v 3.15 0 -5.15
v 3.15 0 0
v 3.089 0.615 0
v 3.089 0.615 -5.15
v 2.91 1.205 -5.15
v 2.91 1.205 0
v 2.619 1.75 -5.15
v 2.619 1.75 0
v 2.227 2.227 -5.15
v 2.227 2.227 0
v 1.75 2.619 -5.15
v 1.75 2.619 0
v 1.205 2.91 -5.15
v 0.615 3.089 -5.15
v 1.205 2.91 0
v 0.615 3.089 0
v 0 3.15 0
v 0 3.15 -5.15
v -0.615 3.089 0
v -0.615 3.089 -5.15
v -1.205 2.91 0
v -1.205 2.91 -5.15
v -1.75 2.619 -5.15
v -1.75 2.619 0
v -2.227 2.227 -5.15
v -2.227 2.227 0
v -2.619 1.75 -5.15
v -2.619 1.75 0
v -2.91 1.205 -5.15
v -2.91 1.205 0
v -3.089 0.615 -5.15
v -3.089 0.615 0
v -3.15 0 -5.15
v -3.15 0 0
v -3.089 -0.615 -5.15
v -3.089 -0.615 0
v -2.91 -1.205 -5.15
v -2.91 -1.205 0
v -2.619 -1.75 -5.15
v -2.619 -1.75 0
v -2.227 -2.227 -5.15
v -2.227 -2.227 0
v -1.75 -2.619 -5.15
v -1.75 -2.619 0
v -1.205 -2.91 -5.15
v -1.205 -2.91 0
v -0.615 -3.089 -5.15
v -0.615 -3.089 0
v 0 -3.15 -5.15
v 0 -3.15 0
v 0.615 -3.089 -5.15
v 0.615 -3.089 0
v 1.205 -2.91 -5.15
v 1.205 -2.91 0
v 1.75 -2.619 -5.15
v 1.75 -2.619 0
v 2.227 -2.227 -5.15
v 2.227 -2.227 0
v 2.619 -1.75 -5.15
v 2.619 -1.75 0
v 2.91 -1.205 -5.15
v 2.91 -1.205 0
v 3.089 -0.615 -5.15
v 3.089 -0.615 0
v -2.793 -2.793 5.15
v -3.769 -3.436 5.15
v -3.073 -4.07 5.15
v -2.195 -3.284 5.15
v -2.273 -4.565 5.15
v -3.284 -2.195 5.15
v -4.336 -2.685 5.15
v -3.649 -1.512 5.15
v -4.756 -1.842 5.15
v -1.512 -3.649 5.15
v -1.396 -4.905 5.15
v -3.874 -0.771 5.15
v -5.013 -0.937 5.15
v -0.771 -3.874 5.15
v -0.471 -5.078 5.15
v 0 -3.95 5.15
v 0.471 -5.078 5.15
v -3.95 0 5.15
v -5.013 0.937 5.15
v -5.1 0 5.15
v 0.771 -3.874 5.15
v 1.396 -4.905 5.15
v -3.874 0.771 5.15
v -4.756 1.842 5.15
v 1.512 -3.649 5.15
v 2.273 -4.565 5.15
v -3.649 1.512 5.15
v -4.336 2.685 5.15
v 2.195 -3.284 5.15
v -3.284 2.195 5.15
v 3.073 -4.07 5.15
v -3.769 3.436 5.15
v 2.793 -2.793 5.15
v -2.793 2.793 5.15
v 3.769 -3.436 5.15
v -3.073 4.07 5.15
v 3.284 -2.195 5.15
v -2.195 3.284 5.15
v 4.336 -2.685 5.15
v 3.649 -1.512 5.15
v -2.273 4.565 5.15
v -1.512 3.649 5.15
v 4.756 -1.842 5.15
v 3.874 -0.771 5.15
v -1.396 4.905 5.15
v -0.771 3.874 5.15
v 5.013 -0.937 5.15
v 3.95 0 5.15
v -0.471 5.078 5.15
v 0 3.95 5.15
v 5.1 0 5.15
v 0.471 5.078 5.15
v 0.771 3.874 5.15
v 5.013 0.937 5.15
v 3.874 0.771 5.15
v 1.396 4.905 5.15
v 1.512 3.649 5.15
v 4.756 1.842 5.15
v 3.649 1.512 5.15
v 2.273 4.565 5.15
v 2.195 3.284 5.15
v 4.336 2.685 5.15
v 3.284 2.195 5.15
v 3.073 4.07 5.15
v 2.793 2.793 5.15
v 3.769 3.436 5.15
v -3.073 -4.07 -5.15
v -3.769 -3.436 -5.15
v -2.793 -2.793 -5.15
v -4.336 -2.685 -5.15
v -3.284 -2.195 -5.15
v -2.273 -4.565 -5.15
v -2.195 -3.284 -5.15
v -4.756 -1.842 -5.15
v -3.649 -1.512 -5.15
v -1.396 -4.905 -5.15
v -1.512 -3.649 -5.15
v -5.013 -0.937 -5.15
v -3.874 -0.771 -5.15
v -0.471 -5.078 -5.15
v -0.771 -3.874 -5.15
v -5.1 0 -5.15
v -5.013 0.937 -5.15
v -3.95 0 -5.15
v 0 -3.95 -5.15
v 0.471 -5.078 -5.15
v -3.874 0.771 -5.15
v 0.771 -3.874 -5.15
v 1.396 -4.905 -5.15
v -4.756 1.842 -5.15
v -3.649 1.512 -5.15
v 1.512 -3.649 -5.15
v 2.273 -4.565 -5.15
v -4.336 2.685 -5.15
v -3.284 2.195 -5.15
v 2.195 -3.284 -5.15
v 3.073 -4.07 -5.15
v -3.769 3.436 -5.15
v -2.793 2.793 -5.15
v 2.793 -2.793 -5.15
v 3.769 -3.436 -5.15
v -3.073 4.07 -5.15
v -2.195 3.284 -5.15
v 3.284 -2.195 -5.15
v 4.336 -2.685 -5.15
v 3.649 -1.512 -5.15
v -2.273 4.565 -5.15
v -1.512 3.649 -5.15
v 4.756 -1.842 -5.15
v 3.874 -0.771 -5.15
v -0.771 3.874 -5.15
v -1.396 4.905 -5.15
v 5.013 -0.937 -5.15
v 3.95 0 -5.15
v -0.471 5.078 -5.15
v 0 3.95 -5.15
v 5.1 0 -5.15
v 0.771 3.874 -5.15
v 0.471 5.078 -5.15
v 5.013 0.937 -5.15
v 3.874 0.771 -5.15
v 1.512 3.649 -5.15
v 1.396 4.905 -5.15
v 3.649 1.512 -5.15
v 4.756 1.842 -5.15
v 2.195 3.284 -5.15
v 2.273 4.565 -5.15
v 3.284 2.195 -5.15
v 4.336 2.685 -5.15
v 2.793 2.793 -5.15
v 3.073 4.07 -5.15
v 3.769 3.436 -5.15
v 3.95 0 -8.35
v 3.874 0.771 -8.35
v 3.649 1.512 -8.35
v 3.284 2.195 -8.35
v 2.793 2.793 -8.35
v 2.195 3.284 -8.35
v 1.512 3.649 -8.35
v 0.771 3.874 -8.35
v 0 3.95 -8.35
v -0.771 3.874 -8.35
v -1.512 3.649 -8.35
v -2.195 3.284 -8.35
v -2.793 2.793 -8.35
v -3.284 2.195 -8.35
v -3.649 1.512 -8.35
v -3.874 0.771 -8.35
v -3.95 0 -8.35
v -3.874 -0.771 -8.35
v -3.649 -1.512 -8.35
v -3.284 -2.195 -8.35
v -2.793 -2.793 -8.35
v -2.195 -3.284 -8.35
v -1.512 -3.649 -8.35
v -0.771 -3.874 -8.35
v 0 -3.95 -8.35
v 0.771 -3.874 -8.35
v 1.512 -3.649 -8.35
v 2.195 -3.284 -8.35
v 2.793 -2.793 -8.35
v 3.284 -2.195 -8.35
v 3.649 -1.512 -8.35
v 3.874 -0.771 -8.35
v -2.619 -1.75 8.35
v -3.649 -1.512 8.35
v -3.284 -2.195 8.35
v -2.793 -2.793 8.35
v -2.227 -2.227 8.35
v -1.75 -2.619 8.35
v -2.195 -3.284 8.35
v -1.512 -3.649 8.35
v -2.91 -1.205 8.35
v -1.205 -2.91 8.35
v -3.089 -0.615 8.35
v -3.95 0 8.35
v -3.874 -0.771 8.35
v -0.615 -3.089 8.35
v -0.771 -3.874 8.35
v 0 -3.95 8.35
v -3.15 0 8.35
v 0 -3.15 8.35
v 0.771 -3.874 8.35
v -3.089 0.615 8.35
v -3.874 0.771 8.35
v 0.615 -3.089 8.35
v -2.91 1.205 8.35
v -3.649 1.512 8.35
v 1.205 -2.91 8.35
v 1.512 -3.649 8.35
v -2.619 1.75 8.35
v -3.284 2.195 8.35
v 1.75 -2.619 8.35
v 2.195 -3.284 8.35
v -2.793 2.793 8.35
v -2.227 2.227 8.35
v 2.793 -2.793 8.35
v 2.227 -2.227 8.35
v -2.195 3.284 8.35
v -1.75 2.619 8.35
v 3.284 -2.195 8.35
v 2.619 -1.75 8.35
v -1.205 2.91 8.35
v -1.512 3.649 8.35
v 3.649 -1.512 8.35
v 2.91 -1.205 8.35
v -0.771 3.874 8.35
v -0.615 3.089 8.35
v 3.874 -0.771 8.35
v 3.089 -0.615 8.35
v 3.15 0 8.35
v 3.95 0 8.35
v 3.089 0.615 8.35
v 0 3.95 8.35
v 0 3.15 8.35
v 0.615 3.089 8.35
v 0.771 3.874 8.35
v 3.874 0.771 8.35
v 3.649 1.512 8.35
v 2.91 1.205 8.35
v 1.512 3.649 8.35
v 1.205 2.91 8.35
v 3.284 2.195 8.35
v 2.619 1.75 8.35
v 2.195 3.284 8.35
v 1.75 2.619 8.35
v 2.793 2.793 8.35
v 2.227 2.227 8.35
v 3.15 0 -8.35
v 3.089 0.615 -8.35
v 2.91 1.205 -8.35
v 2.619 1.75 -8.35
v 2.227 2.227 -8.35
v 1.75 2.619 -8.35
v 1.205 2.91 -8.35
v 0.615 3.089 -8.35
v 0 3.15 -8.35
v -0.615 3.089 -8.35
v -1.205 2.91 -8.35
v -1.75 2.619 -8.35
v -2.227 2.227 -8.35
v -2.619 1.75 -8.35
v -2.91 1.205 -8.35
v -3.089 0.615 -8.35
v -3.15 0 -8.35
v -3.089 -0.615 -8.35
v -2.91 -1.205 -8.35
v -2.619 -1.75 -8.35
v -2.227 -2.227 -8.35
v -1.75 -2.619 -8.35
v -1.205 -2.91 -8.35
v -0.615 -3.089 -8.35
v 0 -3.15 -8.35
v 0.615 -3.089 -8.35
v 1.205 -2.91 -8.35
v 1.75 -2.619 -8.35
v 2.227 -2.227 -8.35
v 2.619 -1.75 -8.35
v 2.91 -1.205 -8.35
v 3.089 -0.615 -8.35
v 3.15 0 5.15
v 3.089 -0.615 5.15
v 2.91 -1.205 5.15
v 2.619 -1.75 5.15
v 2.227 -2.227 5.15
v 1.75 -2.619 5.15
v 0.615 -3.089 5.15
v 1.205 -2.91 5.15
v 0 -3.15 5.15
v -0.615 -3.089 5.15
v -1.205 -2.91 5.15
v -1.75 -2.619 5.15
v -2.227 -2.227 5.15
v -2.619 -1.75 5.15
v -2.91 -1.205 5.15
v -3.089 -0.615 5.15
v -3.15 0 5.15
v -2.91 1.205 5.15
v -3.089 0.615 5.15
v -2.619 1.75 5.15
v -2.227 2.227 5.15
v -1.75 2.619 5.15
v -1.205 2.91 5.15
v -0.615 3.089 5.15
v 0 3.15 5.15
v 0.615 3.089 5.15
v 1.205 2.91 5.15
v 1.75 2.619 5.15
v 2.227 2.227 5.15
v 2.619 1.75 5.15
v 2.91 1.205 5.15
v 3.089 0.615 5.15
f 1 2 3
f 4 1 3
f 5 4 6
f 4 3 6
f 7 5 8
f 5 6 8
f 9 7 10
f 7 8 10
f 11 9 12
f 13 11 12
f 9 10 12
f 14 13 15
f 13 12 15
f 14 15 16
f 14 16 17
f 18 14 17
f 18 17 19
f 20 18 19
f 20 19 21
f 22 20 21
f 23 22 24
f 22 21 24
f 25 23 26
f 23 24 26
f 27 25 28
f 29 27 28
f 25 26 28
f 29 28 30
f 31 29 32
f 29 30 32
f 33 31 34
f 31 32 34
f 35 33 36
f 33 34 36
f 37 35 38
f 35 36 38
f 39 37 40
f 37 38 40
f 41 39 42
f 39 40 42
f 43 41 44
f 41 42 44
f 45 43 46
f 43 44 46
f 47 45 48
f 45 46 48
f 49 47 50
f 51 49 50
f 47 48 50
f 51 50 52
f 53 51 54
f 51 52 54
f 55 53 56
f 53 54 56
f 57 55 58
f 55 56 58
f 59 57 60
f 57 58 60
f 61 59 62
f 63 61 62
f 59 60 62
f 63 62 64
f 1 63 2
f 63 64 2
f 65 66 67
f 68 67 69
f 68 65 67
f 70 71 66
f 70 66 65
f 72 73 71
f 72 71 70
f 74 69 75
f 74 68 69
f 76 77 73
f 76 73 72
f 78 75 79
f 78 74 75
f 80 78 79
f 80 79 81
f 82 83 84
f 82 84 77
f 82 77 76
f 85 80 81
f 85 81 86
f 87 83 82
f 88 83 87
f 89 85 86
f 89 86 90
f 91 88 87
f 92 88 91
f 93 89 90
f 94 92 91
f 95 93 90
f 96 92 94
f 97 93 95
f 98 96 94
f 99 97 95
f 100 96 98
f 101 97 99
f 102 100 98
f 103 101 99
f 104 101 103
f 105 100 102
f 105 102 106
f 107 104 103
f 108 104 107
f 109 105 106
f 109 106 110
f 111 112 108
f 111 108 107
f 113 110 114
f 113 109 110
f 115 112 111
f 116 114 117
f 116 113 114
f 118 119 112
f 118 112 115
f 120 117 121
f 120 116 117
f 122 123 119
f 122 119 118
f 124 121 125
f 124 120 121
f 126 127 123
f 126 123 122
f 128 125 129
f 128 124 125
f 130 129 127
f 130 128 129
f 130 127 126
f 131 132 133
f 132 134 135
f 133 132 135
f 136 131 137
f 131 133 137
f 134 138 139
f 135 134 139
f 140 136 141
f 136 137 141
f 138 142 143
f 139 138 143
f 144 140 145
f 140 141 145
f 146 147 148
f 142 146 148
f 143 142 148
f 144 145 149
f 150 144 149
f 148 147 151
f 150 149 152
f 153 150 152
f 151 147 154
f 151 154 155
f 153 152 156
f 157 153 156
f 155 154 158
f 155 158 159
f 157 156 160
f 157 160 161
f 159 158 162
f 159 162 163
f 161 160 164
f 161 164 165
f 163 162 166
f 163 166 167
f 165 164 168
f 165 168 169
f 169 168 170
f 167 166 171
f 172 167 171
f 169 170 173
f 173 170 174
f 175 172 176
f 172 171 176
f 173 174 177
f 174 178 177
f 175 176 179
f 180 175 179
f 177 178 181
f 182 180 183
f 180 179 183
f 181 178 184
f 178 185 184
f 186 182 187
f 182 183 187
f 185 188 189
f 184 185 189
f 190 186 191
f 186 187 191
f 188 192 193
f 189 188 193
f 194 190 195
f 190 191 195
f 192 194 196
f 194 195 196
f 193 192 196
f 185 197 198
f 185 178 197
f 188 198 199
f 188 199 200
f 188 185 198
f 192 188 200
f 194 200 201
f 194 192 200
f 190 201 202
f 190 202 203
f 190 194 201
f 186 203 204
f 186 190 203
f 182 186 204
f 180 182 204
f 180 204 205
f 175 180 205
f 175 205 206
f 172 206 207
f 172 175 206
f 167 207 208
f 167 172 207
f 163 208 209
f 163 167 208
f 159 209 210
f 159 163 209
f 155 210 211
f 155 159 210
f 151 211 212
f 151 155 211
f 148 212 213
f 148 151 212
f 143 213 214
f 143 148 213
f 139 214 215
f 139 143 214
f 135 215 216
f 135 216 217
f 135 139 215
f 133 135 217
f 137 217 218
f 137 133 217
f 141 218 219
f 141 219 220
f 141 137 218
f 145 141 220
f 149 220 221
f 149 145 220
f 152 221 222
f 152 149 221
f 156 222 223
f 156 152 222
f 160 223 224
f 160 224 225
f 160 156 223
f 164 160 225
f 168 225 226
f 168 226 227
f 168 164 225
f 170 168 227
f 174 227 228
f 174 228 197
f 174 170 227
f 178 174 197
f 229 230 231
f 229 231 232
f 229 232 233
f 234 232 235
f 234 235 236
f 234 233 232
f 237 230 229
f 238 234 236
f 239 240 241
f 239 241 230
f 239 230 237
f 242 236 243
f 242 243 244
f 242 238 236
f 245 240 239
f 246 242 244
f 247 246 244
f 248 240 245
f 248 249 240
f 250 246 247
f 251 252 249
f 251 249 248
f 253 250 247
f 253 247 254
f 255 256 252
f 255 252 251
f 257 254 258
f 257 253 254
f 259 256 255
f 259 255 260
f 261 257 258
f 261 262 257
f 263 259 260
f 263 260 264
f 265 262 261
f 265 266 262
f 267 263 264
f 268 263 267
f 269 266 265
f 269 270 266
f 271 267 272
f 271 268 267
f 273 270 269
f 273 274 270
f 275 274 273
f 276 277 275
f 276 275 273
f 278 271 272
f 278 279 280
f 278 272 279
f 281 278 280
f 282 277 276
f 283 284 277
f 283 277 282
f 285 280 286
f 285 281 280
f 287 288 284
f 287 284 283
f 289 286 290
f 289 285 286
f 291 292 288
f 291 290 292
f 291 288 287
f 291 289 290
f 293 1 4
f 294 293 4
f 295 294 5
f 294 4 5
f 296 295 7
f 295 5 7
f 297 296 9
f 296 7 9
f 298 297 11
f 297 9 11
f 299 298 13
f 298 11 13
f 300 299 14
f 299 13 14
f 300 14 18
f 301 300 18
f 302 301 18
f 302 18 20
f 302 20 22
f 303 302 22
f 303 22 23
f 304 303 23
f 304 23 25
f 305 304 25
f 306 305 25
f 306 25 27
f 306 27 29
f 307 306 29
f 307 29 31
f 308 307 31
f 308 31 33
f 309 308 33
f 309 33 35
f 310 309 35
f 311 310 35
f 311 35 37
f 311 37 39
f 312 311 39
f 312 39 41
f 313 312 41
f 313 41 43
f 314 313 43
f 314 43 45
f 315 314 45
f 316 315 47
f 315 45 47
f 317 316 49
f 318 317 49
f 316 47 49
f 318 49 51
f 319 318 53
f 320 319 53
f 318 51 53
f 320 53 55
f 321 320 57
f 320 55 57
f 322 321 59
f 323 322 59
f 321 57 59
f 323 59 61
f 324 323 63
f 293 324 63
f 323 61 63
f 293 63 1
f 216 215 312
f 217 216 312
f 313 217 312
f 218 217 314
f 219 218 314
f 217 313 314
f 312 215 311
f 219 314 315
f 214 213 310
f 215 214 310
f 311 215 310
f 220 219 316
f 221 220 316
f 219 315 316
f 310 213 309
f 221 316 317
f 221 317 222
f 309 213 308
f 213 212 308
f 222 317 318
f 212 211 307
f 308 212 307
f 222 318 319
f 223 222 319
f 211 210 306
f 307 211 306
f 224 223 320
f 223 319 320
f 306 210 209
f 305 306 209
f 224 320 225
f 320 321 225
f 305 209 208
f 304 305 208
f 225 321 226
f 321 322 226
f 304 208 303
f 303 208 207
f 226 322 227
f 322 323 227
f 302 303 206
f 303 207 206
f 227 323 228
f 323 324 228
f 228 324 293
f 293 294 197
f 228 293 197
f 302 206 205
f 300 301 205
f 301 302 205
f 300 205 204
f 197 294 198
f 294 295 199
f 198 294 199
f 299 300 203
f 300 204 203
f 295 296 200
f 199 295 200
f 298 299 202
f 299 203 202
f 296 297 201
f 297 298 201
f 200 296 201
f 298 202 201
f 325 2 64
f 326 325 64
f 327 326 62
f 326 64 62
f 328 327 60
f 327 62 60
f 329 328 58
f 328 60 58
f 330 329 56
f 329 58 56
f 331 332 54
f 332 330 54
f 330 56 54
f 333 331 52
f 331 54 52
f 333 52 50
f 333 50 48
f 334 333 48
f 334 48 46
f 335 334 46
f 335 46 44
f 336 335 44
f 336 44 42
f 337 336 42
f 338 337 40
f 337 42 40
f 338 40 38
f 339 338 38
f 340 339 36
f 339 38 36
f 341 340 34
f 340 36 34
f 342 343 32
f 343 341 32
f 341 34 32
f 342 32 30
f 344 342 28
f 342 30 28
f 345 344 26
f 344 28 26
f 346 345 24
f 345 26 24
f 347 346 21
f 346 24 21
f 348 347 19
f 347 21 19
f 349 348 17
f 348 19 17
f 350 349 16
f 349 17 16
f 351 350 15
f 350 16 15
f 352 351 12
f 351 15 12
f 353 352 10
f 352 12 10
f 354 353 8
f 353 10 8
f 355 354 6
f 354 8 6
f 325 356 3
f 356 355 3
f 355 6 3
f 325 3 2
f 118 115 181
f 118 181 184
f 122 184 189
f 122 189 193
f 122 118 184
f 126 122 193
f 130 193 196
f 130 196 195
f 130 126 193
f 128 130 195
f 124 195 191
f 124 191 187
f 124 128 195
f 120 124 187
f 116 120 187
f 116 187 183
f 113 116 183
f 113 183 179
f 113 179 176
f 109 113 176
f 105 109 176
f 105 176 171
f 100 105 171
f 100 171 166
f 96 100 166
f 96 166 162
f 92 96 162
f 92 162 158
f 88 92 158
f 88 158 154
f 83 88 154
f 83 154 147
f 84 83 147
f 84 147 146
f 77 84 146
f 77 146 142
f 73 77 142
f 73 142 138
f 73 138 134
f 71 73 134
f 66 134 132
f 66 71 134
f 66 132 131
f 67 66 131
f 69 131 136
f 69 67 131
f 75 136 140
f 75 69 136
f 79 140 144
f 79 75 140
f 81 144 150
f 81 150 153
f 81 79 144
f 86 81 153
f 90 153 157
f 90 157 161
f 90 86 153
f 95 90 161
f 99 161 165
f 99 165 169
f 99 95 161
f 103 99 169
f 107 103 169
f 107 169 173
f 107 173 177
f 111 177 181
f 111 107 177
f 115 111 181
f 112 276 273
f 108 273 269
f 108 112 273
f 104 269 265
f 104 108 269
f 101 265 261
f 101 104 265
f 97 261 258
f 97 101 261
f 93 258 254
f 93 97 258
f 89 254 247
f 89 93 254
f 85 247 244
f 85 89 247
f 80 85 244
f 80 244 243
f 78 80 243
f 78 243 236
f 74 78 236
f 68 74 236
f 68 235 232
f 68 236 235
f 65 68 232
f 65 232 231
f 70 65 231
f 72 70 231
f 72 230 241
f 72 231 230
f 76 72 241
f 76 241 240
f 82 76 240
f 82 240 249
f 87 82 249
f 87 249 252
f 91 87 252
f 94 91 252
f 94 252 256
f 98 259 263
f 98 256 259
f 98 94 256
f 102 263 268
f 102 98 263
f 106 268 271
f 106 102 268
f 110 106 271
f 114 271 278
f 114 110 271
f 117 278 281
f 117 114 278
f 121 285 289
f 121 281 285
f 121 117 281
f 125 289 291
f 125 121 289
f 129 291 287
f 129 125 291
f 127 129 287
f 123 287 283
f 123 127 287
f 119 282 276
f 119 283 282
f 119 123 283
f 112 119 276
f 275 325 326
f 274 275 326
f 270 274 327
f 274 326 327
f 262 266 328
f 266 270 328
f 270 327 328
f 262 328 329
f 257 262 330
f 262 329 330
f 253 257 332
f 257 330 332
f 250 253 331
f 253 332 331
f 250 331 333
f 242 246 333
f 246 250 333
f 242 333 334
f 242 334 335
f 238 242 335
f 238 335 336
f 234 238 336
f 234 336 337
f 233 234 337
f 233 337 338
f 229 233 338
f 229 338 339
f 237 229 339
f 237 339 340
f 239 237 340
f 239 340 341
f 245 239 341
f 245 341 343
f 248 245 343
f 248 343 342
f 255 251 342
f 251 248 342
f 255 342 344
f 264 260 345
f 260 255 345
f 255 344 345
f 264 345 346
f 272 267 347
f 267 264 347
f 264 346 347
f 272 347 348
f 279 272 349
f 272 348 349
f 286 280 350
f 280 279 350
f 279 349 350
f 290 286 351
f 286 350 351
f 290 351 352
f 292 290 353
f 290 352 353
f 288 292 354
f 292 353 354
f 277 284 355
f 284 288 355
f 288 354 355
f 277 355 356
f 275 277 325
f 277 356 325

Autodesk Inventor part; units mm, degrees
ref_plane "YZ Plane" through (0, 0, 0) normal (1, 0, 0) x (0, 1, 0)
ref_plane "XZ Plane" through (0, 0, 0) normal (0, 1, 0) x (-1, 0, 0)
ref_plane "XY Plane" through (0, 0, 0) normal (0, 0, 1) x (1, 0, 0)
sketch "Sketch1" plane through (0, 0, 0) normal (0, 0, 1) x (1, 0, 0)
  circle A0 centre (0, 0) radius 5.1
  circle A1 centre (0, 0) radius 3.95
  circle A2 centre (0, 0) radius 3.15
  dimension "d0" = 10.2
  dimension "d1" = 7.9
  dimension "d4" = 6.3
extrude "Extrusion1" add sketch "Sketch1" along normal mid plane 10.3 contours A0 | A1
extrude "Extrusion2" add sketch "Sketch1" along normal mid plane 16.7 contours A1
properties part number "spacer" material "Stainless Steel"
